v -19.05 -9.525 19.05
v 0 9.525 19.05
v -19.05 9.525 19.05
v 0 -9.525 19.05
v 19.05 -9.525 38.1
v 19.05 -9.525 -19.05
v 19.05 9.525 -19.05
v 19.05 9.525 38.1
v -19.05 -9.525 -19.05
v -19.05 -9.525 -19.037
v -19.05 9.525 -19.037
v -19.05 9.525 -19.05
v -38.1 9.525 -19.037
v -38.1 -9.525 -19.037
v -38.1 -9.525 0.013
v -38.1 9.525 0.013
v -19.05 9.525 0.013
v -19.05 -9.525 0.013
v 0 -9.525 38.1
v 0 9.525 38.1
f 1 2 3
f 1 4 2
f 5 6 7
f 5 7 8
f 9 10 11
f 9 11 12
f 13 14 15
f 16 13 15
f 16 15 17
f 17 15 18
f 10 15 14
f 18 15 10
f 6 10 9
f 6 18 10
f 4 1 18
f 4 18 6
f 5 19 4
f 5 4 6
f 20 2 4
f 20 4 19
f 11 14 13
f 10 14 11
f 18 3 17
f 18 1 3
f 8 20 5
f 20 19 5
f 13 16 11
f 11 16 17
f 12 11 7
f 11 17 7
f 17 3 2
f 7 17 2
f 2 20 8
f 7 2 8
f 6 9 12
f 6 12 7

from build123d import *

# Parameters (mm, degrees)
F0_W     = 19.05
F0_H     = 19.05
F1_DEPTH = 9.525


with BuildPart() as f1:
    # F0 (on Front) → F1 (new body, symmetric)
    with BuildSketch(Plane.XZ):
        Polygon((0, 19.05), (-19.05, 19.05), (-19.05, 0.013117), (-19.05, -19.036883), (-19.05, -19.05), (0, -19.05), (19.05, -19.05), (19.05, 19.05), align=None)
        with Locations((9.525, 28.575)):
            Rectangle(F0_W, F0_H)
        with Locations((-28.575, -9.511883)):
            Rectangle(F0_W, F0_H)
    extrude(amount=F1_DEPTH, both=True)


solid = f1.part
